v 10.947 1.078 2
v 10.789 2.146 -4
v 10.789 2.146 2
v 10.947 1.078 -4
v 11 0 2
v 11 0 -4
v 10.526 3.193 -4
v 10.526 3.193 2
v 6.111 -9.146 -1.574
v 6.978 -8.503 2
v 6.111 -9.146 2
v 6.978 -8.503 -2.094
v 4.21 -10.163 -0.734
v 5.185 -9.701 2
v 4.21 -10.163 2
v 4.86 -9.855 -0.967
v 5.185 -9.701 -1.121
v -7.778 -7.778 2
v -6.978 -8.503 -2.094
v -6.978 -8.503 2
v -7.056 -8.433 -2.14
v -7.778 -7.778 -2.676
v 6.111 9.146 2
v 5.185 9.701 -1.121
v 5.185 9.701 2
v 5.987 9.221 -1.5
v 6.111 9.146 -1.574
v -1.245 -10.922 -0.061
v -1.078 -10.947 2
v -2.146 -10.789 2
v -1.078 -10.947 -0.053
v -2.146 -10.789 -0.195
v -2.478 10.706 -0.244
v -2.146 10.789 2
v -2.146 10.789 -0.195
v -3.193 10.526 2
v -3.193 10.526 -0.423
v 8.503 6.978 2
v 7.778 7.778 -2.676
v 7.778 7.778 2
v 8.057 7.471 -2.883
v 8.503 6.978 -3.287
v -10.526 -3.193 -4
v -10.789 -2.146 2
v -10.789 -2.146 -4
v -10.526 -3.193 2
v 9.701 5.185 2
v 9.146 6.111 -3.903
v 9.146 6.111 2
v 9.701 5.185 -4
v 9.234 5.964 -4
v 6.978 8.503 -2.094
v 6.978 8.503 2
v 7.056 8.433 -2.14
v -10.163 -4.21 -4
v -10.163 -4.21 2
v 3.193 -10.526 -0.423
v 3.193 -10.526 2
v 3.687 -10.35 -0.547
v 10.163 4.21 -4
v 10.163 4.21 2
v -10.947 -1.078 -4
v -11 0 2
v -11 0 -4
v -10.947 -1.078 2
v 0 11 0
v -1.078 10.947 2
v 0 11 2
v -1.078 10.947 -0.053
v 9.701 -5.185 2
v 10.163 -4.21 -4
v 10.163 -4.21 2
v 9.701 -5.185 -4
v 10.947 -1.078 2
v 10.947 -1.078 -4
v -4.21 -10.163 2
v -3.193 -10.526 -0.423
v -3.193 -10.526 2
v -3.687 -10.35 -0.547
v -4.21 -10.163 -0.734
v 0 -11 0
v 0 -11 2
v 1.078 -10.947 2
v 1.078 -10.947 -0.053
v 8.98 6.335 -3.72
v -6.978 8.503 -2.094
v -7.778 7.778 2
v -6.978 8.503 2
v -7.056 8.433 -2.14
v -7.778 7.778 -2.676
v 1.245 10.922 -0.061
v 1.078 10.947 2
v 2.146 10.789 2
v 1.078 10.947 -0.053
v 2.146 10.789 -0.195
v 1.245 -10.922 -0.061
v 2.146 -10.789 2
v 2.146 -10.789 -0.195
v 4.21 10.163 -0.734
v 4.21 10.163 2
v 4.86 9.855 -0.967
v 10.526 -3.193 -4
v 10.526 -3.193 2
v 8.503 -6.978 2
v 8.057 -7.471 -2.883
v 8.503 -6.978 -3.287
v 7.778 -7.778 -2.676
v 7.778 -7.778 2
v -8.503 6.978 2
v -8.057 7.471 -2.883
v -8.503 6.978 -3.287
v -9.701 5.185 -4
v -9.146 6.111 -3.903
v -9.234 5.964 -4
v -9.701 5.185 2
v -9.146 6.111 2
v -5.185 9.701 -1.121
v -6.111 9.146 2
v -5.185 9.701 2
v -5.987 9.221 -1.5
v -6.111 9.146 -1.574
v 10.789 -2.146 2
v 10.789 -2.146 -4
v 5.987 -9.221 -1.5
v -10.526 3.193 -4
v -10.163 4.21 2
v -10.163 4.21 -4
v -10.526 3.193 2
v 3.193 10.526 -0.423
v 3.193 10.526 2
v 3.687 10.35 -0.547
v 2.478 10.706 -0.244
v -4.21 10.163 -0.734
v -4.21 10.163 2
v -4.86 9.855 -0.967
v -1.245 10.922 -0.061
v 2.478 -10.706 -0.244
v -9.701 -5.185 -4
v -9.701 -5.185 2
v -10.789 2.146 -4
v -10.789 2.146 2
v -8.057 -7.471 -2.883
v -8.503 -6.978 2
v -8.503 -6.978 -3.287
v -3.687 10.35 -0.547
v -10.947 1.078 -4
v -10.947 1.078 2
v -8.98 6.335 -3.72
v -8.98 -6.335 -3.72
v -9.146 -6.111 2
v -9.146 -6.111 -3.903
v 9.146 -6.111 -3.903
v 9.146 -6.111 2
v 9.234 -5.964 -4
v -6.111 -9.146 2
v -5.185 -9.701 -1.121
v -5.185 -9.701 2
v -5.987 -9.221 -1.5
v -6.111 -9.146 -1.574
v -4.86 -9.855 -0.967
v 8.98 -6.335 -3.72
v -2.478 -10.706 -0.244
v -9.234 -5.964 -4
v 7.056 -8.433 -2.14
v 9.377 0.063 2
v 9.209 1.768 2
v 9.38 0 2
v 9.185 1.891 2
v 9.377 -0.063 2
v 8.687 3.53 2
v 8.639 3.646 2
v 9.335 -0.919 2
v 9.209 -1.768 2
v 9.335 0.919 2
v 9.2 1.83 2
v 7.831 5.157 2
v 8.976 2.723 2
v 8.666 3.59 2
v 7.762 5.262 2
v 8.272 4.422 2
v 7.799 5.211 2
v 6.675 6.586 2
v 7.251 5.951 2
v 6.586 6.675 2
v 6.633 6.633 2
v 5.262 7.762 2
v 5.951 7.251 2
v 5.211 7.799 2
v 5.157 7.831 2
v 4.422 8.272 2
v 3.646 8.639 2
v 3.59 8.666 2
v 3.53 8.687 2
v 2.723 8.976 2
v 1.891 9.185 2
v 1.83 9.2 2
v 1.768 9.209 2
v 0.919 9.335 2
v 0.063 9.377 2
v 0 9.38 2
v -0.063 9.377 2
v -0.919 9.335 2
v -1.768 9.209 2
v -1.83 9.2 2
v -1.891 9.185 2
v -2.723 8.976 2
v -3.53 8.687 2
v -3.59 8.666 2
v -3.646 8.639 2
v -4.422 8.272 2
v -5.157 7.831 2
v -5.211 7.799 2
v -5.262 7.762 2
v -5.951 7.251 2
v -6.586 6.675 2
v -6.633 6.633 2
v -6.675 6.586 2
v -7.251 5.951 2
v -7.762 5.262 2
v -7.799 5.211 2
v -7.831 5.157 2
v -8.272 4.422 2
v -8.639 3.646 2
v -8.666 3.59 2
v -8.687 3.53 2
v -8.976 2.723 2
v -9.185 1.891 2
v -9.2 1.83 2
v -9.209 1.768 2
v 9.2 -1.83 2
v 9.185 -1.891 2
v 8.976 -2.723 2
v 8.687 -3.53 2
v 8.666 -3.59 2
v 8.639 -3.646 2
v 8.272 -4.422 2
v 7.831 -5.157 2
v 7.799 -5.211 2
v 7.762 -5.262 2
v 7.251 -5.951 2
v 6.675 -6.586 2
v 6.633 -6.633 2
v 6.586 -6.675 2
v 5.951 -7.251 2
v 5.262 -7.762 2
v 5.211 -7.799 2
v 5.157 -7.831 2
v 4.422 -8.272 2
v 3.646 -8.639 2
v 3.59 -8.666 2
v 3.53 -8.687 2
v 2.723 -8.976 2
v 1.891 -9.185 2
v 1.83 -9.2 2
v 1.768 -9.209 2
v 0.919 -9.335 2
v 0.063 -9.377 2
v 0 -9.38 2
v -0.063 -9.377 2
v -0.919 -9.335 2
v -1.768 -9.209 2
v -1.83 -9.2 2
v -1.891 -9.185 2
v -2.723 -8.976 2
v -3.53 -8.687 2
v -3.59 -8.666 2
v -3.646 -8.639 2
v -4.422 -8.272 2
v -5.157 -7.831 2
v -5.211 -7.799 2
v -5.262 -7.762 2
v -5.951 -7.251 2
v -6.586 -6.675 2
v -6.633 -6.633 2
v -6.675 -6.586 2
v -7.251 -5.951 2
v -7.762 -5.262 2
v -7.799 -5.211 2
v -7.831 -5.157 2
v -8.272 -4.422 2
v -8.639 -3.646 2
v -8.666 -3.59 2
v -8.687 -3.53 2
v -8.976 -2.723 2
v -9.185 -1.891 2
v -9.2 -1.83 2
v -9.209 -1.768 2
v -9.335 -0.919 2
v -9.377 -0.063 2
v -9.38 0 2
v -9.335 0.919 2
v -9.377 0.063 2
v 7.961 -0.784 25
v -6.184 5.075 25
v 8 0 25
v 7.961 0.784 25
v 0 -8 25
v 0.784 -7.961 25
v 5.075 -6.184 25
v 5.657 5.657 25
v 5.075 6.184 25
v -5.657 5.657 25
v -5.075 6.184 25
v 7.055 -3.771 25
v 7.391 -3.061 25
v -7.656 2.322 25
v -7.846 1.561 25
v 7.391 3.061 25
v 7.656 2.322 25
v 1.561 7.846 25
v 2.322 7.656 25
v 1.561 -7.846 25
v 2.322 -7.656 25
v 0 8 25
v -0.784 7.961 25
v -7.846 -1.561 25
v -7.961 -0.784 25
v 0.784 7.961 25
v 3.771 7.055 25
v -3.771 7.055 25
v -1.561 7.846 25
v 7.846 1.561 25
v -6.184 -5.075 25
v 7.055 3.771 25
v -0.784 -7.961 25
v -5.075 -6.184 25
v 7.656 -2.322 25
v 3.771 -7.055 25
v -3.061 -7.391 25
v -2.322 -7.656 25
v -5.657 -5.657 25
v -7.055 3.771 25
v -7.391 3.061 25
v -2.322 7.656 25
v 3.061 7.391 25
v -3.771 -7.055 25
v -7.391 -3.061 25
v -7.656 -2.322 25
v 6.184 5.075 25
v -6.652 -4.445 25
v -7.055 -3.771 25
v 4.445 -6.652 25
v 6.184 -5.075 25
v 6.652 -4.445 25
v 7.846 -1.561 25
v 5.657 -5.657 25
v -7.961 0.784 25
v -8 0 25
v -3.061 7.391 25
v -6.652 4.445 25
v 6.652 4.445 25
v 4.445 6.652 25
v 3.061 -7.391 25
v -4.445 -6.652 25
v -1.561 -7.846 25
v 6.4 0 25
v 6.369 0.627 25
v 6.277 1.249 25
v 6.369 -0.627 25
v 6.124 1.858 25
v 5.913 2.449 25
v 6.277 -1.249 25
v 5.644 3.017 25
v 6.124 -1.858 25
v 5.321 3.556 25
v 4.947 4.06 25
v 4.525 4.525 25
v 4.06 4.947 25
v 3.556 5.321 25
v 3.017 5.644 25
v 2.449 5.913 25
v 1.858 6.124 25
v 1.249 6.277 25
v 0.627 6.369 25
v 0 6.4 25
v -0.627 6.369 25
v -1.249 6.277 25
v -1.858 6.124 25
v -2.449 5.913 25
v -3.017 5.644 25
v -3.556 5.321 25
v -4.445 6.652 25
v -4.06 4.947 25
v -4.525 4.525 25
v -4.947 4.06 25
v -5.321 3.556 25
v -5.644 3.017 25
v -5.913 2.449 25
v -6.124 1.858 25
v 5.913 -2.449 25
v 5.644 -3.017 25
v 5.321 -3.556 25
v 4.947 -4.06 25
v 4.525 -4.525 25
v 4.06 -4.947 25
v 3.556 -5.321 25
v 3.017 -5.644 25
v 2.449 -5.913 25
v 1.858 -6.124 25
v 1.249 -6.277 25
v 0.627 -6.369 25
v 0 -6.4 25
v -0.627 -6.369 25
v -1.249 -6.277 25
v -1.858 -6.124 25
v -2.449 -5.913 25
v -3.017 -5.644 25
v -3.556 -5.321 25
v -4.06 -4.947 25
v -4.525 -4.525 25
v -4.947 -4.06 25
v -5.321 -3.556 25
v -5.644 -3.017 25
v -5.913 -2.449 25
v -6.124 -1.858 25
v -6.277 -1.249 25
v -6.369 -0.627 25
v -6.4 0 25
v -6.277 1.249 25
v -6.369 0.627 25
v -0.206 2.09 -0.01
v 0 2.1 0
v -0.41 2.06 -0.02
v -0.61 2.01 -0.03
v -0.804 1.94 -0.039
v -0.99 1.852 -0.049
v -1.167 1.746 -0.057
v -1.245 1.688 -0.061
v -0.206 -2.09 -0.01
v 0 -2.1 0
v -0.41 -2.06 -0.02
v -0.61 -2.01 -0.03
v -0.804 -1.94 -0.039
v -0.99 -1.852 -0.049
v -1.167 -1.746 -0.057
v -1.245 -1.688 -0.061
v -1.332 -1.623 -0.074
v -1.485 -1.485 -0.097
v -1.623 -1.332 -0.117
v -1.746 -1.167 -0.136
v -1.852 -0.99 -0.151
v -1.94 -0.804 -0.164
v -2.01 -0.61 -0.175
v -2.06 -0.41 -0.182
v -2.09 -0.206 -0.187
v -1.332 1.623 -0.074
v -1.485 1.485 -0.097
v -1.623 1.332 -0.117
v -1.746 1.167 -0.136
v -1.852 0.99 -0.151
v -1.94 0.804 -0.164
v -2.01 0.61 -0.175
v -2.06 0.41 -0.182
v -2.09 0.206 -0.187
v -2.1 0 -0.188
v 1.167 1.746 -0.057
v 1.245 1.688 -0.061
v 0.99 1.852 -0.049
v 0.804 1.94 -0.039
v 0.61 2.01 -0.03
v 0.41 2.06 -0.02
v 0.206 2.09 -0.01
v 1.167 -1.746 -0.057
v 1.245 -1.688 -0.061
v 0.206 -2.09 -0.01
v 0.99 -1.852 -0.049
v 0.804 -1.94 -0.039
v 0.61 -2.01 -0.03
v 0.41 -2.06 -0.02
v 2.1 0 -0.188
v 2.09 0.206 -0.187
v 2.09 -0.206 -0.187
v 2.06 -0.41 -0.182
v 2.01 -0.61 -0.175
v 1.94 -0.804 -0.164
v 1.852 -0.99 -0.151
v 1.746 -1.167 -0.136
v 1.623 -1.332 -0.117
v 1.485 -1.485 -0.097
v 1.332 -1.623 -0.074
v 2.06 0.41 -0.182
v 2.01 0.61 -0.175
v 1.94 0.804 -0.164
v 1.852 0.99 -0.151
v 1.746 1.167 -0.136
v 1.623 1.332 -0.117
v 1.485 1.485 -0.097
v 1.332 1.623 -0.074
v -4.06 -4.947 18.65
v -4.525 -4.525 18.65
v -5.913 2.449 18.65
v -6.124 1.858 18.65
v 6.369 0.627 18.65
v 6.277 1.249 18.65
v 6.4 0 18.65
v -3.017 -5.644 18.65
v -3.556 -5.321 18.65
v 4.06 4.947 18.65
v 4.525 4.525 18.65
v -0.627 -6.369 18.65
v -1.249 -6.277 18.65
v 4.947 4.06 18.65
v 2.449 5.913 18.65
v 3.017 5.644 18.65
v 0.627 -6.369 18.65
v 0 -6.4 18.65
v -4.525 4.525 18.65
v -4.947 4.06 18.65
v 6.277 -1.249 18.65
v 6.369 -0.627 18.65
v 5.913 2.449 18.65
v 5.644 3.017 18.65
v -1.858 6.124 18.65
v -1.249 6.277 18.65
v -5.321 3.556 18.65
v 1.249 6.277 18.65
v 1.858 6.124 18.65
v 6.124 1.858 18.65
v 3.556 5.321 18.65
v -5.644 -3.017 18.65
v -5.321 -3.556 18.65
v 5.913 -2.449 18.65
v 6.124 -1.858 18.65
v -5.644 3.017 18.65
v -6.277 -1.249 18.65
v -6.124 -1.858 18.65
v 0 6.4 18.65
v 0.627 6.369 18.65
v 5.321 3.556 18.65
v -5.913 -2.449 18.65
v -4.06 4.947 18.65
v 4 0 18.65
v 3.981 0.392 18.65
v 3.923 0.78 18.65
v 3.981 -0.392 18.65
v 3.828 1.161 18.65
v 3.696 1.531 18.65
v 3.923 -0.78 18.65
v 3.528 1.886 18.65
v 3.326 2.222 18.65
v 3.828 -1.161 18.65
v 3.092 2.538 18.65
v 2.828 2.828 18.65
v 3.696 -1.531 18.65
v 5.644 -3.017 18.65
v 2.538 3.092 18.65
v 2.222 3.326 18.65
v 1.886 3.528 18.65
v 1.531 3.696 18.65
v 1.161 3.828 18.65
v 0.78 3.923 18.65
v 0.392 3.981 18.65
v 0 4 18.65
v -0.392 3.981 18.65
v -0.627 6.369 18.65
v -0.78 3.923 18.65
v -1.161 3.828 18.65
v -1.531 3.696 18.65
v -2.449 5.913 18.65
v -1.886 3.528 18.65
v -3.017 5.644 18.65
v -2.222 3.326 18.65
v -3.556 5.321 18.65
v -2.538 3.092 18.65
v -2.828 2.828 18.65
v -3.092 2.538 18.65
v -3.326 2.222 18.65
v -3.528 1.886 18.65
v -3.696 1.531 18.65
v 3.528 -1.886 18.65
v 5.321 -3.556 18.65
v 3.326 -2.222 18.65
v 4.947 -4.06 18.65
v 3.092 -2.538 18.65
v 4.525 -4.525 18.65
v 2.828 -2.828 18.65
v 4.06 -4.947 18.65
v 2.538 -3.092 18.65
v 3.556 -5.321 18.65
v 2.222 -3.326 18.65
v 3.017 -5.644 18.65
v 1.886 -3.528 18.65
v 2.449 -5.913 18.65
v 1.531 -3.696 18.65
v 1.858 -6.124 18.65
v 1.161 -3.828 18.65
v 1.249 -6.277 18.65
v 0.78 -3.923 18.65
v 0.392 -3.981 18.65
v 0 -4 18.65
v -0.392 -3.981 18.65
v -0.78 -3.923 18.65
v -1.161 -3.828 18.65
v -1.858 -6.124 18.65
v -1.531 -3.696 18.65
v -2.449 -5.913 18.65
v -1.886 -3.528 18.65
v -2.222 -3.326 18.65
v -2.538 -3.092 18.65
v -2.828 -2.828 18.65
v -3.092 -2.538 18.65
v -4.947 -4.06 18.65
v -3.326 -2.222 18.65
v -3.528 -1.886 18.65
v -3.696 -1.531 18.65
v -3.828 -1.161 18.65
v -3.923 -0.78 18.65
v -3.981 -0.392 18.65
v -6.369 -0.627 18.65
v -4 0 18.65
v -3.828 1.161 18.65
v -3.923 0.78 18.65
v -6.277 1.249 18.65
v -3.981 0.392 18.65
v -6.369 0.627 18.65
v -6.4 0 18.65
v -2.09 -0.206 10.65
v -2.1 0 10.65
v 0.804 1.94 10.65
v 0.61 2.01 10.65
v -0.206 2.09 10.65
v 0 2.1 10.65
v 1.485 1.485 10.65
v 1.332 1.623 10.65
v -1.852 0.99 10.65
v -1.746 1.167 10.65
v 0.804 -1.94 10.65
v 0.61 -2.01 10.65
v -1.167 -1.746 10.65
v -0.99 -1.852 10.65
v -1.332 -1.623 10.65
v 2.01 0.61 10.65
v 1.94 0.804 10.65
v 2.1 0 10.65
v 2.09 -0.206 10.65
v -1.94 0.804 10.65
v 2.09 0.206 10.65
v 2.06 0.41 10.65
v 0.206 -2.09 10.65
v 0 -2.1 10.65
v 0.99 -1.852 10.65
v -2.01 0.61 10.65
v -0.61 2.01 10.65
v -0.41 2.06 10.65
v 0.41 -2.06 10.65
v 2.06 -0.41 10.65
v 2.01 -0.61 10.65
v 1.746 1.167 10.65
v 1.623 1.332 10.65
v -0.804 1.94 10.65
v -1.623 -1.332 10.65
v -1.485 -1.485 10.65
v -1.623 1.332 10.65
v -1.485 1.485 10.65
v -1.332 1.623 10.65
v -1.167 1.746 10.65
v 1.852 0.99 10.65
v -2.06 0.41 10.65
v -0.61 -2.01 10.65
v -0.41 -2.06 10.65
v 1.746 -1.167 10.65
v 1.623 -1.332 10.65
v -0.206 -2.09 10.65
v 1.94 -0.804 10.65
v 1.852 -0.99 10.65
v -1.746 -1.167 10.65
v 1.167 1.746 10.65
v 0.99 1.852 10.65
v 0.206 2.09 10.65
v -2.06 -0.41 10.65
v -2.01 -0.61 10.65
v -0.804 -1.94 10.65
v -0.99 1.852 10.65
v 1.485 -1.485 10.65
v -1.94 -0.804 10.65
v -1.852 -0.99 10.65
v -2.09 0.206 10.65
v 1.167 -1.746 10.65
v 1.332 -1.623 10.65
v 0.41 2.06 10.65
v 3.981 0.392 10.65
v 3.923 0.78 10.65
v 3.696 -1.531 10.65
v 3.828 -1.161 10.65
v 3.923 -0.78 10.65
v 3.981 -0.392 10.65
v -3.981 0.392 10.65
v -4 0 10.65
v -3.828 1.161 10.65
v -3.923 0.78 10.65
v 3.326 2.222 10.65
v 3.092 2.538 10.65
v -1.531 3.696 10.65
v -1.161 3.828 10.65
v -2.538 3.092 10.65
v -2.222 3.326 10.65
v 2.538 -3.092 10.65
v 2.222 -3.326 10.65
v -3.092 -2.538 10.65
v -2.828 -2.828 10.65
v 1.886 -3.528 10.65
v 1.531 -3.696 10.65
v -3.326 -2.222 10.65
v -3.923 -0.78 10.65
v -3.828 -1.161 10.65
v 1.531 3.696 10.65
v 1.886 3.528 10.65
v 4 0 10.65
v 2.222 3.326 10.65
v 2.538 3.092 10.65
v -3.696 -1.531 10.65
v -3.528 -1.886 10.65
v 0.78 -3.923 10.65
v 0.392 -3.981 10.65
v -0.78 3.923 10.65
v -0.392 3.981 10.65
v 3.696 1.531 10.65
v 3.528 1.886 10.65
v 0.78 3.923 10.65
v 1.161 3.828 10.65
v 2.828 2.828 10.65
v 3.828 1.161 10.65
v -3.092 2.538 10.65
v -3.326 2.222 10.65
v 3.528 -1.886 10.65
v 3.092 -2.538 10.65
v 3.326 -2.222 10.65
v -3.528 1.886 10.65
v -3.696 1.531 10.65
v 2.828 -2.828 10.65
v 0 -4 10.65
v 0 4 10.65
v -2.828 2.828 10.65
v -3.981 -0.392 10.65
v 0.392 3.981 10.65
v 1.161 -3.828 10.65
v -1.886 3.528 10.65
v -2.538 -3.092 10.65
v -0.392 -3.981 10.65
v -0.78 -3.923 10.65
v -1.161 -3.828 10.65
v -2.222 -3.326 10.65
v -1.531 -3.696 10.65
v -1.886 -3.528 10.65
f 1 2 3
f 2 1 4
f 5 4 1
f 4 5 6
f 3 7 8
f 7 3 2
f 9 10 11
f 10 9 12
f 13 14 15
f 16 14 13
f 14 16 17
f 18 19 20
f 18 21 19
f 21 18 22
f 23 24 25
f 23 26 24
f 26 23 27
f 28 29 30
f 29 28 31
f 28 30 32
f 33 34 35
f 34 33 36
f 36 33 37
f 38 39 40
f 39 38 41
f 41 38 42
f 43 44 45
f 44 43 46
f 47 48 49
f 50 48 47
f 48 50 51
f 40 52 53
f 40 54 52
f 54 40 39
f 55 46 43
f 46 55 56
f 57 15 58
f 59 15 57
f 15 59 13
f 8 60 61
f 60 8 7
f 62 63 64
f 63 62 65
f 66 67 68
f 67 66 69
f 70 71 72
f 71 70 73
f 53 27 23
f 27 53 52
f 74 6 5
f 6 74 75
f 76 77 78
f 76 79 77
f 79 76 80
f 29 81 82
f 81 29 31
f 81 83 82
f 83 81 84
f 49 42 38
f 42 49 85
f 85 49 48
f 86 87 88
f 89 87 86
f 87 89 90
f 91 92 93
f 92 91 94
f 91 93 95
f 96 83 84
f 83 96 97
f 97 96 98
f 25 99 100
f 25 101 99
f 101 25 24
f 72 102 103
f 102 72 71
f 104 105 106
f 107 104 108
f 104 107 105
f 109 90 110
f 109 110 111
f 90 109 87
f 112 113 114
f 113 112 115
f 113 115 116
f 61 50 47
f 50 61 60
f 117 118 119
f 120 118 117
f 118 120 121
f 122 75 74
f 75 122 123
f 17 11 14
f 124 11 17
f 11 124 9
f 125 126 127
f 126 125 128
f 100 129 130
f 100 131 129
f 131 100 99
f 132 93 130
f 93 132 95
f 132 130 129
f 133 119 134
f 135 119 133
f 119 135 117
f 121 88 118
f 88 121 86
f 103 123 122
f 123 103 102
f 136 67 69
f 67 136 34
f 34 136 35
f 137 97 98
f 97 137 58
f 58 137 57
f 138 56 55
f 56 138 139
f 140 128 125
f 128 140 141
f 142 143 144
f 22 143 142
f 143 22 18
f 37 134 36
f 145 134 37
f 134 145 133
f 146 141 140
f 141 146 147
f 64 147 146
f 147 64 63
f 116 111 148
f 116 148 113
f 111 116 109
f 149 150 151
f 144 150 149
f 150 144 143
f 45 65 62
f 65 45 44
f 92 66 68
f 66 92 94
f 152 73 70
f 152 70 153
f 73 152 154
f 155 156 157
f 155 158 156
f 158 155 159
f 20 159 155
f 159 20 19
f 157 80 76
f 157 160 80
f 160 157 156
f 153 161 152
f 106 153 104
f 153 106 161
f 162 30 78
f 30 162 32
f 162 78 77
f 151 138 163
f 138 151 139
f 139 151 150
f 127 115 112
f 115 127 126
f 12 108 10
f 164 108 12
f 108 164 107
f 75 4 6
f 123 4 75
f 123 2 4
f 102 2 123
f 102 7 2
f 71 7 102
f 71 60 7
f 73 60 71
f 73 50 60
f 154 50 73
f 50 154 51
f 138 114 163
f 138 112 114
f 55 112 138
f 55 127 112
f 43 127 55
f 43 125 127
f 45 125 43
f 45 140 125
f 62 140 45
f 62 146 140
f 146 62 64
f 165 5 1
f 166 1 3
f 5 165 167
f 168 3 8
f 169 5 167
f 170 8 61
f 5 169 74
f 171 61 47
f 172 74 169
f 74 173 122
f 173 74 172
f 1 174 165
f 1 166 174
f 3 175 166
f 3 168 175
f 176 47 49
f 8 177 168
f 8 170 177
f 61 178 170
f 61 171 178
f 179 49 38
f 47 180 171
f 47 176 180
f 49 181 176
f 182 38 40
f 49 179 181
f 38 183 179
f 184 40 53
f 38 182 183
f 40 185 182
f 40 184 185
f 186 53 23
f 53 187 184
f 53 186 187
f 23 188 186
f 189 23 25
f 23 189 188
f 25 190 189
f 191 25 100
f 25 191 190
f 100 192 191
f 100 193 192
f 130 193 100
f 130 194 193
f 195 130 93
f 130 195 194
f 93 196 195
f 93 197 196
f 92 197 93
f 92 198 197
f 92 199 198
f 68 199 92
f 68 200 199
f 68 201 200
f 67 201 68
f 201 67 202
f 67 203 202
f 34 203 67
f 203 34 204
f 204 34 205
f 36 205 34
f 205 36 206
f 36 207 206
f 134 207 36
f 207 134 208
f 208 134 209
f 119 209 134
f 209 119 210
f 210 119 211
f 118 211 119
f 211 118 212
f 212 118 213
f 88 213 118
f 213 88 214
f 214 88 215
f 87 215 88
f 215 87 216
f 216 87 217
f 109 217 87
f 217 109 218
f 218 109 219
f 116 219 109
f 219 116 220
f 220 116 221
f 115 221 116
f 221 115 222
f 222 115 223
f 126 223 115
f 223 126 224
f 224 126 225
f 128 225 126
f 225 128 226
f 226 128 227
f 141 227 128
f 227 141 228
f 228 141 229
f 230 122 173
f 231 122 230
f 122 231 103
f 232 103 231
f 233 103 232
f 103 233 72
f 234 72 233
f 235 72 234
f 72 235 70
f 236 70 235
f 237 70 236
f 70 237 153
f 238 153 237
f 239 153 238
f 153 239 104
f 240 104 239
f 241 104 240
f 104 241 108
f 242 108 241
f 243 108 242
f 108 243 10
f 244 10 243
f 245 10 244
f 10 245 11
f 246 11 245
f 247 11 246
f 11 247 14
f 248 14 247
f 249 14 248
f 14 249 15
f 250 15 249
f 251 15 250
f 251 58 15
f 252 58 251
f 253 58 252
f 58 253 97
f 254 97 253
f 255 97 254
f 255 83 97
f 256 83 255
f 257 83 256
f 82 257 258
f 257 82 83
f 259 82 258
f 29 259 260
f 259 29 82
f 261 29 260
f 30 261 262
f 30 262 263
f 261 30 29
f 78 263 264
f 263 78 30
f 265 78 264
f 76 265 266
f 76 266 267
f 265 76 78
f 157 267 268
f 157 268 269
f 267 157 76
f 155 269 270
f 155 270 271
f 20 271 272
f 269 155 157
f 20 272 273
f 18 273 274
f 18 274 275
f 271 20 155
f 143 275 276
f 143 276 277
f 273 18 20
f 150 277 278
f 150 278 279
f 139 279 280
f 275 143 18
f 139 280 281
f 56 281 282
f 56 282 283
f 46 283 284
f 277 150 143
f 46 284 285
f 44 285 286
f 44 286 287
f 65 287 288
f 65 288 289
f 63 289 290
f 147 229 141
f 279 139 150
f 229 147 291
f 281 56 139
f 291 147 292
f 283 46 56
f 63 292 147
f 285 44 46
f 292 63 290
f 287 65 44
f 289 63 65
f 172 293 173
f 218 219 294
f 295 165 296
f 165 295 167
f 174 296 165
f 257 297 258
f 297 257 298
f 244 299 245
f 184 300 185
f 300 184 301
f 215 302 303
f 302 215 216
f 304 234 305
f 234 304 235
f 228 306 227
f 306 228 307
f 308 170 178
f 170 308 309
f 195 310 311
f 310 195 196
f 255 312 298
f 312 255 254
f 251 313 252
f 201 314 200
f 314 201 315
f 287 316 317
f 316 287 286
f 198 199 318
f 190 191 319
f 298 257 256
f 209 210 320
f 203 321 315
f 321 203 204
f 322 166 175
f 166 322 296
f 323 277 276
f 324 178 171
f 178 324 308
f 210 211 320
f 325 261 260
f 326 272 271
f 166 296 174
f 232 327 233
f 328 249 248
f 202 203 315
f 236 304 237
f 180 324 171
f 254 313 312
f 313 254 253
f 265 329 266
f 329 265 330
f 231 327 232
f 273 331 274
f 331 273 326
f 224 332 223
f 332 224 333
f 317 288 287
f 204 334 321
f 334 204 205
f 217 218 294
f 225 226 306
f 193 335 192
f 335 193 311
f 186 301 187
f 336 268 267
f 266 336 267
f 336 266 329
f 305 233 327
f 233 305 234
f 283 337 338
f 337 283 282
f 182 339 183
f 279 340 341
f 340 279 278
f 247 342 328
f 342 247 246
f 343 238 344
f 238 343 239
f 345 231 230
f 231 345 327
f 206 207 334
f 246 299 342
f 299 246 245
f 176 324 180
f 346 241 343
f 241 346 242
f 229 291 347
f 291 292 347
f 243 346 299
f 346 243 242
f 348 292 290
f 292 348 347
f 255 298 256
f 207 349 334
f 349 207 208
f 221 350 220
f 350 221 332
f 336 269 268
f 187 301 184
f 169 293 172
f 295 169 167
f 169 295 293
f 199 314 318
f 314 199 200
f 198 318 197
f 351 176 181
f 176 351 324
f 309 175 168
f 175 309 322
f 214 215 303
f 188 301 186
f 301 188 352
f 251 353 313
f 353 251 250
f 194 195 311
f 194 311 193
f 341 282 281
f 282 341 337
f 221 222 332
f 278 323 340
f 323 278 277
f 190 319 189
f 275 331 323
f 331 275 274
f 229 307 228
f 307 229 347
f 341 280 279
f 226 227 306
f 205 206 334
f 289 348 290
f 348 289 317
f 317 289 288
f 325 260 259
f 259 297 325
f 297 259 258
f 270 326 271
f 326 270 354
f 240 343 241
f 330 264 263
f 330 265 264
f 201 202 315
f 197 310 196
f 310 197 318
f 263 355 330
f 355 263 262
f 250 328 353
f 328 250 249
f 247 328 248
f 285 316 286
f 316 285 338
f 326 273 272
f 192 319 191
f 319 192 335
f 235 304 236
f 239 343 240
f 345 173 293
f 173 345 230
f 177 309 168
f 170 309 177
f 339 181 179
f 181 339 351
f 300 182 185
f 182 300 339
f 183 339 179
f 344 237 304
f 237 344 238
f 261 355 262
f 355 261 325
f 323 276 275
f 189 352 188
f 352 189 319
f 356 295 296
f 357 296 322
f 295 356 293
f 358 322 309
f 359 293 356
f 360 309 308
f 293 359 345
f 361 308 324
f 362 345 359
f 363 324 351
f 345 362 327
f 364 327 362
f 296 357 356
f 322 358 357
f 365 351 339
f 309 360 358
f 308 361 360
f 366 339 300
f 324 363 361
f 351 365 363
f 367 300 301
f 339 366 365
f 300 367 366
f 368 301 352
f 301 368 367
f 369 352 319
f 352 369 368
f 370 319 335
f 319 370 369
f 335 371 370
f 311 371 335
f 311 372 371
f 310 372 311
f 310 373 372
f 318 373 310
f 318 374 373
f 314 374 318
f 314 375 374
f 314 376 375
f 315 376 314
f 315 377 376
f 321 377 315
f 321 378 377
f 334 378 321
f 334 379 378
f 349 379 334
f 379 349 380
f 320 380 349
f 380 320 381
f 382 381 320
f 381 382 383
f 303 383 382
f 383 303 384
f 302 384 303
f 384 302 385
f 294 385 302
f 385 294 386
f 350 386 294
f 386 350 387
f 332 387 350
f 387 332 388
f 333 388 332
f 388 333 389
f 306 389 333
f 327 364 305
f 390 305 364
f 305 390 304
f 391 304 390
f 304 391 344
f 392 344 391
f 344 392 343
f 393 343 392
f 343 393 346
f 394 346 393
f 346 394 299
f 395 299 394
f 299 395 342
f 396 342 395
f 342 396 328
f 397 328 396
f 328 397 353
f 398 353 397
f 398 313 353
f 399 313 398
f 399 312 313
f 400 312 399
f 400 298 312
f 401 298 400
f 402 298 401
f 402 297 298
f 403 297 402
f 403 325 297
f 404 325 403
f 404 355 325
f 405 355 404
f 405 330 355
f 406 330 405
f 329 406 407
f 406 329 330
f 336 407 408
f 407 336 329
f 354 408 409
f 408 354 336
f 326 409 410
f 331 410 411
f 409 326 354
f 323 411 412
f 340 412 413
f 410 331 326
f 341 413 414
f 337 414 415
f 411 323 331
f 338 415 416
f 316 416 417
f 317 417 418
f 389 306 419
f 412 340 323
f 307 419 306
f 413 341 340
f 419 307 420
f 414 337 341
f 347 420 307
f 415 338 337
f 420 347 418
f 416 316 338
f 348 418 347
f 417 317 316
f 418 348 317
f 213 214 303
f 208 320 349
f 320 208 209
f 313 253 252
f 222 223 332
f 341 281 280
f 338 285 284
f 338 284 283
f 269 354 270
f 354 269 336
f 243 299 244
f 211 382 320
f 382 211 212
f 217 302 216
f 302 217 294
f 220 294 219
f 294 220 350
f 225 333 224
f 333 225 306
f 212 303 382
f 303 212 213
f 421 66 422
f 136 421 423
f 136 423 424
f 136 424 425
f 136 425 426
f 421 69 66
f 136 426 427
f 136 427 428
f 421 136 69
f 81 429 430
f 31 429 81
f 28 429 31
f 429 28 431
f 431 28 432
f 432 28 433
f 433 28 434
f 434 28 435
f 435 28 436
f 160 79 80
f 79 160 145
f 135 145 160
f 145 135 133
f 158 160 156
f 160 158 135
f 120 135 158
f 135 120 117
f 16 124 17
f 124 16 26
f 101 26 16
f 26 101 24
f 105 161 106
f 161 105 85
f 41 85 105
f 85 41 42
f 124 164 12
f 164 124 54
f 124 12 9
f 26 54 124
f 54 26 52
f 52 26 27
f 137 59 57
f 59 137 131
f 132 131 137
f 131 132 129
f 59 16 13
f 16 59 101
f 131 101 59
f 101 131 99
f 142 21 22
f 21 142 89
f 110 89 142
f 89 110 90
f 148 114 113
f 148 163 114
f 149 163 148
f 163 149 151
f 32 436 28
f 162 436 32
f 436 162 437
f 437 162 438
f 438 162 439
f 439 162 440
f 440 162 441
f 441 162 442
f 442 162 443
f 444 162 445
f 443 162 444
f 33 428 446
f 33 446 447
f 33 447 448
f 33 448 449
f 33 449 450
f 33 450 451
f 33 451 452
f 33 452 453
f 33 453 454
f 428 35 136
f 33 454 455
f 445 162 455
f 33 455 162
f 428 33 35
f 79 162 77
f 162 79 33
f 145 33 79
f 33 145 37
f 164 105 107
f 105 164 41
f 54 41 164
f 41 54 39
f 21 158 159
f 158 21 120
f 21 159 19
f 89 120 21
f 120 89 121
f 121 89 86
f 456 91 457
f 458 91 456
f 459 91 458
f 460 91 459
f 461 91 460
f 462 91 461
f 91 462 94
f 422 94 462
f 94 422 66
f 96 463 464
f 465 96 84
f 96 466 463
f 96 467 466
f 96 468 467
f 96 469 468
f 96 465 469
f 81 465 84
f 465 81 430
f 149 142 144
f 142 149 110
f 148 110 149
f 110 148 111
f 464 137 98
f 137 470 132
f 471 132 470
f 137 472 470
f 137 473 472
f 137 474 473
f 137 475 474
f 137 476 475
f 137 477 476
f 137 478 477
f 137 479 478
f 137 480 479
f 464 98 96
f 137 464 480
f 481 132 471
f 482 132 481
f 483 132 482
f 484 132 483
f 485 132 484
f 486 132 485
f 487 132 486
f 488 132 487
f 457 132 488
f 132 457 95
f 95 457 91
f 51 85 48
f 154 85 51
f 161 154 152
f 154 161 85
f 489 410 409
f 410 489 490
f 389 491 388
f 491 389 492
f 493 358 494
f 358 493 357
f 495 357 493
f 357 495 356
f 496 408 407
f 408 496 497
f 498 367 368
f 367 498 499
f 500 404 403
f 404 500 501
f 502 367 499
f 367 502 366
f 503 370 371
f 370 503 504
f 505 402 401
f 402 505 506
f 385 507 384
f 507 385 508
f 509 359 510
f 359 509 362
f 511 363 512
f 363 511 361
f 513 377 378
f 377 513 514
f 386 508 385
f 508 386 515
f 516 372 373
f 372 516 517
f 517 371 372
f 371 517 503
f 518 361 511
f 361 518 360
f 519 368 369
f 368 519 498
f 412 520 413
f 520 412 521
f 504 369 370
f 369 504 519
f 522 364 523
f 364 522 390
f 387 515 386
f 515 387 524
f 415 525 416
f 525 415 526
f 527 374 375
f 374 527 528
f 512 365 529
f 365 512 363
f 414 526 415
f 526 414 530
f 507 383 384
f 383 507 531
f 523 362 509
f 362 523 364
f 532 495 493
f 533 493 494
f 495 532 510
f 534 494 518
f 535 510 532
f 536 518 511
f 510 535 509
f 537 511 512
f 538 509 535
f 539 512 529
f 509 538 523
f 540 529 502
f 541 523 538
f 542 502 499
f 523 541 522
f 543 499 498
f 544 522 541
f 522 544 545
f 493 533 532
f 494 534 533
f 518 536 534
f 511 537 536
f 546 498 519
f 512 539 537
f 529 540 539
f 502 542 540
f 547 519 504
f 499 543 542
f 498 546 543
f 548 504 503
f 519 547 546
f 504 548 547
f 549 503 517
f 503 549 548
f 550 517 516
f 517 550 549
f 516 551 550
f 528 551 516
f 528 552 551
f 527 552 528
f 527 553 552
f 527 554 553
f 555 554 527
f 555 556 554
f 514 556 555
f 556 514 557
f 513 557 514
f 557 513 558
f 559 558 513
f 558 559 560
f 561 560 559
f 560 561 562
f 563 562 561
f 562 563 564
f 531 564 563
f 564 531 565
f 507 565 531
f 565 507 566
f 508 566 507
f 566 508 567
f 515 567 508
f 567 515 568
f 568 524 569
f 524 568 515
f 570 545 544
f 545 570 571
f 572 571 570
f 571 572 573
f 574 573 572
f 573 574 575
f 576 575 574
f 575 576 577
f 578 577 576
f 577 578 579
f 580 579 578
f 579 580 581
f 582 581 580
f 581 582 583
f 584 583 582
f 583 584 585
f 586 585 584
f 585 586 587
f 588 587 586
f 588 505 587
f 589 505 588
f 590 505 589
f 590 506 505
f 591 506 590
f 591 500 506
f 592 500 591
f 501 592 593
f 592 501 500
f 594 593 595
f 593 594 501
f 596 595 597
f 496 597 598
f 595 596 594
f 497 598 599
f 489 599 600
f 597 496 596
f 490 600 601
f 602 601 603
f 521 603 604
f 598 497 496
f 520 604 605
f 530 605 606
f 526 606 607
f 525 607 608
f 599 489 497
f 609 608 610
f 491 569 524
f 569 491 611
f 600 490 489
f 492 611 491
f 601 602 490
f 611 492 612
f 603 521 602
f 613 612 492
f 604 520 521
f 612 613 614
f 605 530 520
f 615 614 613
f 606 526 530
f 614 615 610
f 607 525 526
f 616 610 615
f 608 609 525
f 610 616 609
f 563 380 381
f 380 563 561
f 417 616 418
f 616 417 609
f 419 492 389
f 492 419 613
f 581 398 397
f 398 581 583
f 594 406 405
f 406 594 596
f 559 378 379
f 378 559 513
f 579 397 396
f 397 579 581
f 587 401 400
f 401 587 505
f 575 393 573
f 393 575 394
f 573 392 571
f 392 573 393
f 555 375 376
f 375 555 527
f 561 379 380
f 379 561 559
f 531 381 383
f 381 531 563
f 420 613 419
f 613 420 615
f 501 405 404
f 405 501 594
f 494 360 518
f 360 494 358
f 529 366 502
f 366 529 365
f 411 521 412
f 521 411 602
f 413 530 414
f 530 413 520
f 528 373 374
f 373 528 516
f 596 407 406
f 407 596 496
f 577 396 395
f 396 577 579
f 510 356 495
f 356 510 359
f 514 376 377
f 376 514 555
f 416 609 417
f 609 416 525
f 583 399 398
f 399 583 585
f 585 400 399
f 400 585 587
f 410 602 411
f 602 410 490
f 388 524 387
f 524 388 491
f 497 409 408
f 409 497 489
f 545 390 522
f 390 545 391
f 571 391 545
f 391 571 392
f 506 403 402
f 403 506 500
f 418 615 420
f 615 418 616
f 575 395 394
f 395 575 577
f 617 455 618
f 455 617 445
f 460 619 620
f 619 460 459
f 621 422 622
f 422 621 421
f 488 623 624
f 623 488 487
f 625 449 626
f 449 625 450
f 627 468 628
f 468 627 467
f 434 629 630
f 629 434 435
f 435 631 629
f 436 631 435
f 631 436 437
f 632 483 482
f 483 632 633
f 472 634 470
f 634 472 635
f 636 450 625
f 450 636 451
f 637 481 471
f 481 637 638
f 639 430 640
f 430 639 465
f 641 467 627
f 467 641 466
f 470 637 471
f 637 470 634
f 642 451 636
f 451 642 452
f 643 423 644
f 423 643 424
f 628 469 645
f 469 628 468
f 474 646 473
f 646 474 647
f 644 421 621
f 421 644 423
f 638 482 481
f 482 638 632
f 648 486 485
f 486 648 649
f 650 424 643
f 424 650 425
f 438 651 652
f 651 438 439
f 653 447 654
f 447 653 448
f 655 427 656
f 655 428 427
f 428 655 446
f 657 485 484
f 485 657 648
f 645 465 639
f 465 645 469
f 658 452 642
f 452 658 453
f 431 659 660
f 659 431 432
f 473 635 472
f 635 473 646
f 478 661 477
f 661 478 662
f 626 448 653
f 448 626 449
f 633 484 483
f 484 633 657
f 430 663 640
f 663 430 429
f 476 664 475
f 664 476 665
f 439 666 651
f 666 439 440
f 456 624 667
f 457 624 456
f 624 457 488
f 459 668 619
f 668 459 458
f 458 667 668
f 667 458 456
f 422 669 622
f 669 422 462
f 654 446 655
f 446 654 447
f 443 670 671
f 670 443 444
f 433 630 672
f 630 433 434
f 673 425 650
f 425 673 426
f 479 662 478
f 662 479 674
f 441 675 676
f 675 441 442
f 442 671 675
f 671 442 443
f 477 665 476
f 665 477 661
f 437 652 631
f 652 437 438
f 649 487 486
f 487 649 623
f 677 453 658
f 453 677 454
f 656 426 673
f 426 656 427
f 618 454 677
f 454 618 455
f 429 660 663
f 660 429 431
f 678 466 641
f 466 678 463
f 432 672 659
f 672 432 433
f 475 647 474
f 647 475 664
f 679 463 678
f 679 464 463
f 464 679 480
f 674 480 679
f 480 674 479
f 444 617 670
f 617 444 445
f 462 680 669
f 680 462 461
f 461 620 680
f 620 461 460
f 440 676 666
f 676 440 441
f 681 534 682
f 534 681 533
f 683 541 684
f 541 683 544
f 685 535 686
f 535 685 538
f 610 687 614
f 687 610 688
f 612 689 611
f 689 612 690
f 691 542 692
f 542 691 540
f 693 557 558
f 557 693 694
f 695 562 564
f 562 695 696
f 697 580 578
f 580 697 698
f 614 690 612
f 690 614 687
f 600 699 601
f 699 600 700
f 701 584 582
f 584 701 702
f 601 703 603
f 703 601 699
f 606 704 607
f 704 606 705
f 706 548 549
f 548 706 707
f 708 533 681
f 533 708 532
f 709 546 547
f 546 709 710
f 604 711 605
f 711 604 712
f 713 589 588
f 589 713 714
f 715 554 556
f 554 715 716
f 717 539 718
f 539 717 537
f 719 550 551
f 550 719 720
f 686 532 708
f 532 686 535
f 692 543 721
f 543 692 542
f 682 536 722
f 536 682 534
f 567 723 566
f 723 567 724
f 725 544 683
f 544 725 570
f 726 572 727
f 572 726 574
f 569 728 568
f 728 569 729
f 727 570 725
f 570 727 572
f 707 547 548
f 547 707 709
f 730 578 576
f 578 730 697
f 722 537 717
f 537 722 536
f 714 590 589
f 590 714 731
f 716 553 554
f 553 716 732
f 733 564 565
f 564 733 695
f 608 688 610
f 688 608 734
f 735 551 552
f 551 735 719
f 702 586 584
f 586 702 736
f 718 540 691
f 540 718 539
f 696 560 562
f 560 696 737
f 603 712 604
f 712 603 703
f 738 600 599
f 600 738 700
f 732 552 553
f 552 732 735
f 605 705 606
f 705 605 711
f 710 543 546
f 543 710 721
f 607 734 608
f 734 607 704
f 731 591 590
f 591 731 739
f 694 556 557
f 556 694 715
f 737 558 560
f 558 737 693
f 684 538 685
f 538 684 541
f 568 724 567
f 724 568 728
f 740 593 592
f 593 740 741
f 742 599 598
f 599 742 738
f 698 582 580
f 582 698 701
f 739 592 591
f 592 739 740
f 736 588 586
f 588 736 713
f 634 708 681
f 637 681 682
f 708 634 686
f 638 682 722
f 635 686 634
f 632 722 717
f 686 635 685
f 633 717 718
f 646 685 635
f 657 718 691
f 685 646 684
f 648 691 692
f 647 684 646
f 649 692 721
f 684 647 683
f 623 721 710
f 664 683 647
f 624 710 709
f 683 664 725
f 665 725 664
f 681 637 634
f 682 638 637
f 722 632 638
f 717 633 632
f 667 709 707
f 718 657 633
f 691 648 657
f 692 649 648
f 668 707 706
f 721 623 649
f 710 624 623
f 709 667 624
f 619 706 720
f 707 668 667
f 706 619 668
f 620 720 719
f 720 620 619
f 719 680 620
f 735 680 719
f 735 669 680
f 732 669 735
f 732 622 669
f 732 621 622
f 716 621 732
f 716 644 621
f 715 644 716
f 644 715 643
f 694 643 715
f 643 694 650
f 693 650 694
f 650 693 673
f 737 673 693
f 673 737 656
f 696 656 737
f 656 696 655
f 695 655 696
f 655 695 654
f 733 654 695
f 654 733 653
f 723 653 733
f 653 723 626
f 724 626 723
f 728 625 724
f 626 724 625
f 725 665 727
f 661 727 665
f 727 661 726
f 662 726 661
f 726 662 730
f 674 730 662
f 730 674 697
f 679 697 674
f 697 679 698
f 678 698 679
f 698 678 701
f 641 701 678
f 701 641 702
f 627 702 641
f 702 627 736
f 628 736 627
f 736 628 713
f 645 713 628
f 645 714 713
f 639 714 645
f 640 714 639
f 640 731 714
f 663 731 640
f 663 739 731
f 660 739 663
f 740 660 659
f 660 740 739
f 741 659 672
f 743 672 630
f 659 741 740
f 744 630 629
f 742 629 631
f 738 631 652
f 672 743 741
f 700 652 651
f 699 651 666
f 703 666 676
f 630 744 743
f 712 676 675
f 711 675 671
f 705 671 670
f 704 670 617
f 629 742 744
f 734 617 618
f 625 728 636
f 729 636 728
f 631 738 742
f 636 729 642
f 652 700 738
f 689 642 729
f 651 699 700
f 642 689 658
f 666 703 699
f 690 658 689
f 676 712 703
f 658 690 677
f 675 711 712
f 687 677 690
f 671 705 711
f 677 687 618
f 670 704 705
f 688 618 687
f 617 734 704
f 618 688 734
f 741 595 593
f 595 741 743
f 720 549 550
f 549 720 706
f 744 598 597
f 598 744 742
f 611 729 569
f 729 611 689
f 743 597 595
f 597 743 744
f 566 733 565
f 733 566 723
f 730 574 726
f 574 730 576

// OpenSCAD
// Breakaway fruiting spur for the apple-picking practice rig. Print in PLA or PETG, 100 % infill, lying on its side.
// It screws onto the 25 mm trunk dowel (one 4 x 40 mm wood screw through the centre hole) and holds a
// 1/2 x 1/4 in N42 disc magnet (K&J Magnetics D84) flush with its tip, glued in with epoxy.
// Units: mm. The spur's axis is +z, from the trunk's surface (z = 0) to the tip.

trunk_d = 25.4;      // trunk dowel
spur_len = 25;       // trunk surface to tip face
tip_d = 16;          // spur body: holds the 12.7 mm magnet
magnet_d = 12.8;     // pocket: 1/2 in magnet + 0.1 mm clearance
magnet_h = 6.35;     // 1/4 in
screw_d = 4.2;
$fn = 64;

difference() {
    union() {
        // saddle on the trunk
        translate([0, 0, -4]) cylinder(d = 22, h = 6);
        // spur body, tapering slightly like a woody spur
        cylinder(d1 = 19, d2 = tip_d, h = spur_len);
    }
    // the trunk itself (the saddle's concave face)
    translate([0, 0, -trunk_d / 2]) rotate([90, 0, 0]) cylinder(d = trunk_d, h = 40, center = true);
    // magnet pocket, flush with the tip
    translate([0, 0, spur_len - magnet_h]) cylinder(d = magnet_d, h = magnet_h + 1);
    // screw hole (head from the tip side, under the magnet)
    translate([0, 0, -20]) cylinder(d = screw_d, h = spur_len + 20 - magnet_h - 1);
    translate([0, 0, spur_len - magnet_h - 8]) cylinder(d = 8, h = 8);
}
